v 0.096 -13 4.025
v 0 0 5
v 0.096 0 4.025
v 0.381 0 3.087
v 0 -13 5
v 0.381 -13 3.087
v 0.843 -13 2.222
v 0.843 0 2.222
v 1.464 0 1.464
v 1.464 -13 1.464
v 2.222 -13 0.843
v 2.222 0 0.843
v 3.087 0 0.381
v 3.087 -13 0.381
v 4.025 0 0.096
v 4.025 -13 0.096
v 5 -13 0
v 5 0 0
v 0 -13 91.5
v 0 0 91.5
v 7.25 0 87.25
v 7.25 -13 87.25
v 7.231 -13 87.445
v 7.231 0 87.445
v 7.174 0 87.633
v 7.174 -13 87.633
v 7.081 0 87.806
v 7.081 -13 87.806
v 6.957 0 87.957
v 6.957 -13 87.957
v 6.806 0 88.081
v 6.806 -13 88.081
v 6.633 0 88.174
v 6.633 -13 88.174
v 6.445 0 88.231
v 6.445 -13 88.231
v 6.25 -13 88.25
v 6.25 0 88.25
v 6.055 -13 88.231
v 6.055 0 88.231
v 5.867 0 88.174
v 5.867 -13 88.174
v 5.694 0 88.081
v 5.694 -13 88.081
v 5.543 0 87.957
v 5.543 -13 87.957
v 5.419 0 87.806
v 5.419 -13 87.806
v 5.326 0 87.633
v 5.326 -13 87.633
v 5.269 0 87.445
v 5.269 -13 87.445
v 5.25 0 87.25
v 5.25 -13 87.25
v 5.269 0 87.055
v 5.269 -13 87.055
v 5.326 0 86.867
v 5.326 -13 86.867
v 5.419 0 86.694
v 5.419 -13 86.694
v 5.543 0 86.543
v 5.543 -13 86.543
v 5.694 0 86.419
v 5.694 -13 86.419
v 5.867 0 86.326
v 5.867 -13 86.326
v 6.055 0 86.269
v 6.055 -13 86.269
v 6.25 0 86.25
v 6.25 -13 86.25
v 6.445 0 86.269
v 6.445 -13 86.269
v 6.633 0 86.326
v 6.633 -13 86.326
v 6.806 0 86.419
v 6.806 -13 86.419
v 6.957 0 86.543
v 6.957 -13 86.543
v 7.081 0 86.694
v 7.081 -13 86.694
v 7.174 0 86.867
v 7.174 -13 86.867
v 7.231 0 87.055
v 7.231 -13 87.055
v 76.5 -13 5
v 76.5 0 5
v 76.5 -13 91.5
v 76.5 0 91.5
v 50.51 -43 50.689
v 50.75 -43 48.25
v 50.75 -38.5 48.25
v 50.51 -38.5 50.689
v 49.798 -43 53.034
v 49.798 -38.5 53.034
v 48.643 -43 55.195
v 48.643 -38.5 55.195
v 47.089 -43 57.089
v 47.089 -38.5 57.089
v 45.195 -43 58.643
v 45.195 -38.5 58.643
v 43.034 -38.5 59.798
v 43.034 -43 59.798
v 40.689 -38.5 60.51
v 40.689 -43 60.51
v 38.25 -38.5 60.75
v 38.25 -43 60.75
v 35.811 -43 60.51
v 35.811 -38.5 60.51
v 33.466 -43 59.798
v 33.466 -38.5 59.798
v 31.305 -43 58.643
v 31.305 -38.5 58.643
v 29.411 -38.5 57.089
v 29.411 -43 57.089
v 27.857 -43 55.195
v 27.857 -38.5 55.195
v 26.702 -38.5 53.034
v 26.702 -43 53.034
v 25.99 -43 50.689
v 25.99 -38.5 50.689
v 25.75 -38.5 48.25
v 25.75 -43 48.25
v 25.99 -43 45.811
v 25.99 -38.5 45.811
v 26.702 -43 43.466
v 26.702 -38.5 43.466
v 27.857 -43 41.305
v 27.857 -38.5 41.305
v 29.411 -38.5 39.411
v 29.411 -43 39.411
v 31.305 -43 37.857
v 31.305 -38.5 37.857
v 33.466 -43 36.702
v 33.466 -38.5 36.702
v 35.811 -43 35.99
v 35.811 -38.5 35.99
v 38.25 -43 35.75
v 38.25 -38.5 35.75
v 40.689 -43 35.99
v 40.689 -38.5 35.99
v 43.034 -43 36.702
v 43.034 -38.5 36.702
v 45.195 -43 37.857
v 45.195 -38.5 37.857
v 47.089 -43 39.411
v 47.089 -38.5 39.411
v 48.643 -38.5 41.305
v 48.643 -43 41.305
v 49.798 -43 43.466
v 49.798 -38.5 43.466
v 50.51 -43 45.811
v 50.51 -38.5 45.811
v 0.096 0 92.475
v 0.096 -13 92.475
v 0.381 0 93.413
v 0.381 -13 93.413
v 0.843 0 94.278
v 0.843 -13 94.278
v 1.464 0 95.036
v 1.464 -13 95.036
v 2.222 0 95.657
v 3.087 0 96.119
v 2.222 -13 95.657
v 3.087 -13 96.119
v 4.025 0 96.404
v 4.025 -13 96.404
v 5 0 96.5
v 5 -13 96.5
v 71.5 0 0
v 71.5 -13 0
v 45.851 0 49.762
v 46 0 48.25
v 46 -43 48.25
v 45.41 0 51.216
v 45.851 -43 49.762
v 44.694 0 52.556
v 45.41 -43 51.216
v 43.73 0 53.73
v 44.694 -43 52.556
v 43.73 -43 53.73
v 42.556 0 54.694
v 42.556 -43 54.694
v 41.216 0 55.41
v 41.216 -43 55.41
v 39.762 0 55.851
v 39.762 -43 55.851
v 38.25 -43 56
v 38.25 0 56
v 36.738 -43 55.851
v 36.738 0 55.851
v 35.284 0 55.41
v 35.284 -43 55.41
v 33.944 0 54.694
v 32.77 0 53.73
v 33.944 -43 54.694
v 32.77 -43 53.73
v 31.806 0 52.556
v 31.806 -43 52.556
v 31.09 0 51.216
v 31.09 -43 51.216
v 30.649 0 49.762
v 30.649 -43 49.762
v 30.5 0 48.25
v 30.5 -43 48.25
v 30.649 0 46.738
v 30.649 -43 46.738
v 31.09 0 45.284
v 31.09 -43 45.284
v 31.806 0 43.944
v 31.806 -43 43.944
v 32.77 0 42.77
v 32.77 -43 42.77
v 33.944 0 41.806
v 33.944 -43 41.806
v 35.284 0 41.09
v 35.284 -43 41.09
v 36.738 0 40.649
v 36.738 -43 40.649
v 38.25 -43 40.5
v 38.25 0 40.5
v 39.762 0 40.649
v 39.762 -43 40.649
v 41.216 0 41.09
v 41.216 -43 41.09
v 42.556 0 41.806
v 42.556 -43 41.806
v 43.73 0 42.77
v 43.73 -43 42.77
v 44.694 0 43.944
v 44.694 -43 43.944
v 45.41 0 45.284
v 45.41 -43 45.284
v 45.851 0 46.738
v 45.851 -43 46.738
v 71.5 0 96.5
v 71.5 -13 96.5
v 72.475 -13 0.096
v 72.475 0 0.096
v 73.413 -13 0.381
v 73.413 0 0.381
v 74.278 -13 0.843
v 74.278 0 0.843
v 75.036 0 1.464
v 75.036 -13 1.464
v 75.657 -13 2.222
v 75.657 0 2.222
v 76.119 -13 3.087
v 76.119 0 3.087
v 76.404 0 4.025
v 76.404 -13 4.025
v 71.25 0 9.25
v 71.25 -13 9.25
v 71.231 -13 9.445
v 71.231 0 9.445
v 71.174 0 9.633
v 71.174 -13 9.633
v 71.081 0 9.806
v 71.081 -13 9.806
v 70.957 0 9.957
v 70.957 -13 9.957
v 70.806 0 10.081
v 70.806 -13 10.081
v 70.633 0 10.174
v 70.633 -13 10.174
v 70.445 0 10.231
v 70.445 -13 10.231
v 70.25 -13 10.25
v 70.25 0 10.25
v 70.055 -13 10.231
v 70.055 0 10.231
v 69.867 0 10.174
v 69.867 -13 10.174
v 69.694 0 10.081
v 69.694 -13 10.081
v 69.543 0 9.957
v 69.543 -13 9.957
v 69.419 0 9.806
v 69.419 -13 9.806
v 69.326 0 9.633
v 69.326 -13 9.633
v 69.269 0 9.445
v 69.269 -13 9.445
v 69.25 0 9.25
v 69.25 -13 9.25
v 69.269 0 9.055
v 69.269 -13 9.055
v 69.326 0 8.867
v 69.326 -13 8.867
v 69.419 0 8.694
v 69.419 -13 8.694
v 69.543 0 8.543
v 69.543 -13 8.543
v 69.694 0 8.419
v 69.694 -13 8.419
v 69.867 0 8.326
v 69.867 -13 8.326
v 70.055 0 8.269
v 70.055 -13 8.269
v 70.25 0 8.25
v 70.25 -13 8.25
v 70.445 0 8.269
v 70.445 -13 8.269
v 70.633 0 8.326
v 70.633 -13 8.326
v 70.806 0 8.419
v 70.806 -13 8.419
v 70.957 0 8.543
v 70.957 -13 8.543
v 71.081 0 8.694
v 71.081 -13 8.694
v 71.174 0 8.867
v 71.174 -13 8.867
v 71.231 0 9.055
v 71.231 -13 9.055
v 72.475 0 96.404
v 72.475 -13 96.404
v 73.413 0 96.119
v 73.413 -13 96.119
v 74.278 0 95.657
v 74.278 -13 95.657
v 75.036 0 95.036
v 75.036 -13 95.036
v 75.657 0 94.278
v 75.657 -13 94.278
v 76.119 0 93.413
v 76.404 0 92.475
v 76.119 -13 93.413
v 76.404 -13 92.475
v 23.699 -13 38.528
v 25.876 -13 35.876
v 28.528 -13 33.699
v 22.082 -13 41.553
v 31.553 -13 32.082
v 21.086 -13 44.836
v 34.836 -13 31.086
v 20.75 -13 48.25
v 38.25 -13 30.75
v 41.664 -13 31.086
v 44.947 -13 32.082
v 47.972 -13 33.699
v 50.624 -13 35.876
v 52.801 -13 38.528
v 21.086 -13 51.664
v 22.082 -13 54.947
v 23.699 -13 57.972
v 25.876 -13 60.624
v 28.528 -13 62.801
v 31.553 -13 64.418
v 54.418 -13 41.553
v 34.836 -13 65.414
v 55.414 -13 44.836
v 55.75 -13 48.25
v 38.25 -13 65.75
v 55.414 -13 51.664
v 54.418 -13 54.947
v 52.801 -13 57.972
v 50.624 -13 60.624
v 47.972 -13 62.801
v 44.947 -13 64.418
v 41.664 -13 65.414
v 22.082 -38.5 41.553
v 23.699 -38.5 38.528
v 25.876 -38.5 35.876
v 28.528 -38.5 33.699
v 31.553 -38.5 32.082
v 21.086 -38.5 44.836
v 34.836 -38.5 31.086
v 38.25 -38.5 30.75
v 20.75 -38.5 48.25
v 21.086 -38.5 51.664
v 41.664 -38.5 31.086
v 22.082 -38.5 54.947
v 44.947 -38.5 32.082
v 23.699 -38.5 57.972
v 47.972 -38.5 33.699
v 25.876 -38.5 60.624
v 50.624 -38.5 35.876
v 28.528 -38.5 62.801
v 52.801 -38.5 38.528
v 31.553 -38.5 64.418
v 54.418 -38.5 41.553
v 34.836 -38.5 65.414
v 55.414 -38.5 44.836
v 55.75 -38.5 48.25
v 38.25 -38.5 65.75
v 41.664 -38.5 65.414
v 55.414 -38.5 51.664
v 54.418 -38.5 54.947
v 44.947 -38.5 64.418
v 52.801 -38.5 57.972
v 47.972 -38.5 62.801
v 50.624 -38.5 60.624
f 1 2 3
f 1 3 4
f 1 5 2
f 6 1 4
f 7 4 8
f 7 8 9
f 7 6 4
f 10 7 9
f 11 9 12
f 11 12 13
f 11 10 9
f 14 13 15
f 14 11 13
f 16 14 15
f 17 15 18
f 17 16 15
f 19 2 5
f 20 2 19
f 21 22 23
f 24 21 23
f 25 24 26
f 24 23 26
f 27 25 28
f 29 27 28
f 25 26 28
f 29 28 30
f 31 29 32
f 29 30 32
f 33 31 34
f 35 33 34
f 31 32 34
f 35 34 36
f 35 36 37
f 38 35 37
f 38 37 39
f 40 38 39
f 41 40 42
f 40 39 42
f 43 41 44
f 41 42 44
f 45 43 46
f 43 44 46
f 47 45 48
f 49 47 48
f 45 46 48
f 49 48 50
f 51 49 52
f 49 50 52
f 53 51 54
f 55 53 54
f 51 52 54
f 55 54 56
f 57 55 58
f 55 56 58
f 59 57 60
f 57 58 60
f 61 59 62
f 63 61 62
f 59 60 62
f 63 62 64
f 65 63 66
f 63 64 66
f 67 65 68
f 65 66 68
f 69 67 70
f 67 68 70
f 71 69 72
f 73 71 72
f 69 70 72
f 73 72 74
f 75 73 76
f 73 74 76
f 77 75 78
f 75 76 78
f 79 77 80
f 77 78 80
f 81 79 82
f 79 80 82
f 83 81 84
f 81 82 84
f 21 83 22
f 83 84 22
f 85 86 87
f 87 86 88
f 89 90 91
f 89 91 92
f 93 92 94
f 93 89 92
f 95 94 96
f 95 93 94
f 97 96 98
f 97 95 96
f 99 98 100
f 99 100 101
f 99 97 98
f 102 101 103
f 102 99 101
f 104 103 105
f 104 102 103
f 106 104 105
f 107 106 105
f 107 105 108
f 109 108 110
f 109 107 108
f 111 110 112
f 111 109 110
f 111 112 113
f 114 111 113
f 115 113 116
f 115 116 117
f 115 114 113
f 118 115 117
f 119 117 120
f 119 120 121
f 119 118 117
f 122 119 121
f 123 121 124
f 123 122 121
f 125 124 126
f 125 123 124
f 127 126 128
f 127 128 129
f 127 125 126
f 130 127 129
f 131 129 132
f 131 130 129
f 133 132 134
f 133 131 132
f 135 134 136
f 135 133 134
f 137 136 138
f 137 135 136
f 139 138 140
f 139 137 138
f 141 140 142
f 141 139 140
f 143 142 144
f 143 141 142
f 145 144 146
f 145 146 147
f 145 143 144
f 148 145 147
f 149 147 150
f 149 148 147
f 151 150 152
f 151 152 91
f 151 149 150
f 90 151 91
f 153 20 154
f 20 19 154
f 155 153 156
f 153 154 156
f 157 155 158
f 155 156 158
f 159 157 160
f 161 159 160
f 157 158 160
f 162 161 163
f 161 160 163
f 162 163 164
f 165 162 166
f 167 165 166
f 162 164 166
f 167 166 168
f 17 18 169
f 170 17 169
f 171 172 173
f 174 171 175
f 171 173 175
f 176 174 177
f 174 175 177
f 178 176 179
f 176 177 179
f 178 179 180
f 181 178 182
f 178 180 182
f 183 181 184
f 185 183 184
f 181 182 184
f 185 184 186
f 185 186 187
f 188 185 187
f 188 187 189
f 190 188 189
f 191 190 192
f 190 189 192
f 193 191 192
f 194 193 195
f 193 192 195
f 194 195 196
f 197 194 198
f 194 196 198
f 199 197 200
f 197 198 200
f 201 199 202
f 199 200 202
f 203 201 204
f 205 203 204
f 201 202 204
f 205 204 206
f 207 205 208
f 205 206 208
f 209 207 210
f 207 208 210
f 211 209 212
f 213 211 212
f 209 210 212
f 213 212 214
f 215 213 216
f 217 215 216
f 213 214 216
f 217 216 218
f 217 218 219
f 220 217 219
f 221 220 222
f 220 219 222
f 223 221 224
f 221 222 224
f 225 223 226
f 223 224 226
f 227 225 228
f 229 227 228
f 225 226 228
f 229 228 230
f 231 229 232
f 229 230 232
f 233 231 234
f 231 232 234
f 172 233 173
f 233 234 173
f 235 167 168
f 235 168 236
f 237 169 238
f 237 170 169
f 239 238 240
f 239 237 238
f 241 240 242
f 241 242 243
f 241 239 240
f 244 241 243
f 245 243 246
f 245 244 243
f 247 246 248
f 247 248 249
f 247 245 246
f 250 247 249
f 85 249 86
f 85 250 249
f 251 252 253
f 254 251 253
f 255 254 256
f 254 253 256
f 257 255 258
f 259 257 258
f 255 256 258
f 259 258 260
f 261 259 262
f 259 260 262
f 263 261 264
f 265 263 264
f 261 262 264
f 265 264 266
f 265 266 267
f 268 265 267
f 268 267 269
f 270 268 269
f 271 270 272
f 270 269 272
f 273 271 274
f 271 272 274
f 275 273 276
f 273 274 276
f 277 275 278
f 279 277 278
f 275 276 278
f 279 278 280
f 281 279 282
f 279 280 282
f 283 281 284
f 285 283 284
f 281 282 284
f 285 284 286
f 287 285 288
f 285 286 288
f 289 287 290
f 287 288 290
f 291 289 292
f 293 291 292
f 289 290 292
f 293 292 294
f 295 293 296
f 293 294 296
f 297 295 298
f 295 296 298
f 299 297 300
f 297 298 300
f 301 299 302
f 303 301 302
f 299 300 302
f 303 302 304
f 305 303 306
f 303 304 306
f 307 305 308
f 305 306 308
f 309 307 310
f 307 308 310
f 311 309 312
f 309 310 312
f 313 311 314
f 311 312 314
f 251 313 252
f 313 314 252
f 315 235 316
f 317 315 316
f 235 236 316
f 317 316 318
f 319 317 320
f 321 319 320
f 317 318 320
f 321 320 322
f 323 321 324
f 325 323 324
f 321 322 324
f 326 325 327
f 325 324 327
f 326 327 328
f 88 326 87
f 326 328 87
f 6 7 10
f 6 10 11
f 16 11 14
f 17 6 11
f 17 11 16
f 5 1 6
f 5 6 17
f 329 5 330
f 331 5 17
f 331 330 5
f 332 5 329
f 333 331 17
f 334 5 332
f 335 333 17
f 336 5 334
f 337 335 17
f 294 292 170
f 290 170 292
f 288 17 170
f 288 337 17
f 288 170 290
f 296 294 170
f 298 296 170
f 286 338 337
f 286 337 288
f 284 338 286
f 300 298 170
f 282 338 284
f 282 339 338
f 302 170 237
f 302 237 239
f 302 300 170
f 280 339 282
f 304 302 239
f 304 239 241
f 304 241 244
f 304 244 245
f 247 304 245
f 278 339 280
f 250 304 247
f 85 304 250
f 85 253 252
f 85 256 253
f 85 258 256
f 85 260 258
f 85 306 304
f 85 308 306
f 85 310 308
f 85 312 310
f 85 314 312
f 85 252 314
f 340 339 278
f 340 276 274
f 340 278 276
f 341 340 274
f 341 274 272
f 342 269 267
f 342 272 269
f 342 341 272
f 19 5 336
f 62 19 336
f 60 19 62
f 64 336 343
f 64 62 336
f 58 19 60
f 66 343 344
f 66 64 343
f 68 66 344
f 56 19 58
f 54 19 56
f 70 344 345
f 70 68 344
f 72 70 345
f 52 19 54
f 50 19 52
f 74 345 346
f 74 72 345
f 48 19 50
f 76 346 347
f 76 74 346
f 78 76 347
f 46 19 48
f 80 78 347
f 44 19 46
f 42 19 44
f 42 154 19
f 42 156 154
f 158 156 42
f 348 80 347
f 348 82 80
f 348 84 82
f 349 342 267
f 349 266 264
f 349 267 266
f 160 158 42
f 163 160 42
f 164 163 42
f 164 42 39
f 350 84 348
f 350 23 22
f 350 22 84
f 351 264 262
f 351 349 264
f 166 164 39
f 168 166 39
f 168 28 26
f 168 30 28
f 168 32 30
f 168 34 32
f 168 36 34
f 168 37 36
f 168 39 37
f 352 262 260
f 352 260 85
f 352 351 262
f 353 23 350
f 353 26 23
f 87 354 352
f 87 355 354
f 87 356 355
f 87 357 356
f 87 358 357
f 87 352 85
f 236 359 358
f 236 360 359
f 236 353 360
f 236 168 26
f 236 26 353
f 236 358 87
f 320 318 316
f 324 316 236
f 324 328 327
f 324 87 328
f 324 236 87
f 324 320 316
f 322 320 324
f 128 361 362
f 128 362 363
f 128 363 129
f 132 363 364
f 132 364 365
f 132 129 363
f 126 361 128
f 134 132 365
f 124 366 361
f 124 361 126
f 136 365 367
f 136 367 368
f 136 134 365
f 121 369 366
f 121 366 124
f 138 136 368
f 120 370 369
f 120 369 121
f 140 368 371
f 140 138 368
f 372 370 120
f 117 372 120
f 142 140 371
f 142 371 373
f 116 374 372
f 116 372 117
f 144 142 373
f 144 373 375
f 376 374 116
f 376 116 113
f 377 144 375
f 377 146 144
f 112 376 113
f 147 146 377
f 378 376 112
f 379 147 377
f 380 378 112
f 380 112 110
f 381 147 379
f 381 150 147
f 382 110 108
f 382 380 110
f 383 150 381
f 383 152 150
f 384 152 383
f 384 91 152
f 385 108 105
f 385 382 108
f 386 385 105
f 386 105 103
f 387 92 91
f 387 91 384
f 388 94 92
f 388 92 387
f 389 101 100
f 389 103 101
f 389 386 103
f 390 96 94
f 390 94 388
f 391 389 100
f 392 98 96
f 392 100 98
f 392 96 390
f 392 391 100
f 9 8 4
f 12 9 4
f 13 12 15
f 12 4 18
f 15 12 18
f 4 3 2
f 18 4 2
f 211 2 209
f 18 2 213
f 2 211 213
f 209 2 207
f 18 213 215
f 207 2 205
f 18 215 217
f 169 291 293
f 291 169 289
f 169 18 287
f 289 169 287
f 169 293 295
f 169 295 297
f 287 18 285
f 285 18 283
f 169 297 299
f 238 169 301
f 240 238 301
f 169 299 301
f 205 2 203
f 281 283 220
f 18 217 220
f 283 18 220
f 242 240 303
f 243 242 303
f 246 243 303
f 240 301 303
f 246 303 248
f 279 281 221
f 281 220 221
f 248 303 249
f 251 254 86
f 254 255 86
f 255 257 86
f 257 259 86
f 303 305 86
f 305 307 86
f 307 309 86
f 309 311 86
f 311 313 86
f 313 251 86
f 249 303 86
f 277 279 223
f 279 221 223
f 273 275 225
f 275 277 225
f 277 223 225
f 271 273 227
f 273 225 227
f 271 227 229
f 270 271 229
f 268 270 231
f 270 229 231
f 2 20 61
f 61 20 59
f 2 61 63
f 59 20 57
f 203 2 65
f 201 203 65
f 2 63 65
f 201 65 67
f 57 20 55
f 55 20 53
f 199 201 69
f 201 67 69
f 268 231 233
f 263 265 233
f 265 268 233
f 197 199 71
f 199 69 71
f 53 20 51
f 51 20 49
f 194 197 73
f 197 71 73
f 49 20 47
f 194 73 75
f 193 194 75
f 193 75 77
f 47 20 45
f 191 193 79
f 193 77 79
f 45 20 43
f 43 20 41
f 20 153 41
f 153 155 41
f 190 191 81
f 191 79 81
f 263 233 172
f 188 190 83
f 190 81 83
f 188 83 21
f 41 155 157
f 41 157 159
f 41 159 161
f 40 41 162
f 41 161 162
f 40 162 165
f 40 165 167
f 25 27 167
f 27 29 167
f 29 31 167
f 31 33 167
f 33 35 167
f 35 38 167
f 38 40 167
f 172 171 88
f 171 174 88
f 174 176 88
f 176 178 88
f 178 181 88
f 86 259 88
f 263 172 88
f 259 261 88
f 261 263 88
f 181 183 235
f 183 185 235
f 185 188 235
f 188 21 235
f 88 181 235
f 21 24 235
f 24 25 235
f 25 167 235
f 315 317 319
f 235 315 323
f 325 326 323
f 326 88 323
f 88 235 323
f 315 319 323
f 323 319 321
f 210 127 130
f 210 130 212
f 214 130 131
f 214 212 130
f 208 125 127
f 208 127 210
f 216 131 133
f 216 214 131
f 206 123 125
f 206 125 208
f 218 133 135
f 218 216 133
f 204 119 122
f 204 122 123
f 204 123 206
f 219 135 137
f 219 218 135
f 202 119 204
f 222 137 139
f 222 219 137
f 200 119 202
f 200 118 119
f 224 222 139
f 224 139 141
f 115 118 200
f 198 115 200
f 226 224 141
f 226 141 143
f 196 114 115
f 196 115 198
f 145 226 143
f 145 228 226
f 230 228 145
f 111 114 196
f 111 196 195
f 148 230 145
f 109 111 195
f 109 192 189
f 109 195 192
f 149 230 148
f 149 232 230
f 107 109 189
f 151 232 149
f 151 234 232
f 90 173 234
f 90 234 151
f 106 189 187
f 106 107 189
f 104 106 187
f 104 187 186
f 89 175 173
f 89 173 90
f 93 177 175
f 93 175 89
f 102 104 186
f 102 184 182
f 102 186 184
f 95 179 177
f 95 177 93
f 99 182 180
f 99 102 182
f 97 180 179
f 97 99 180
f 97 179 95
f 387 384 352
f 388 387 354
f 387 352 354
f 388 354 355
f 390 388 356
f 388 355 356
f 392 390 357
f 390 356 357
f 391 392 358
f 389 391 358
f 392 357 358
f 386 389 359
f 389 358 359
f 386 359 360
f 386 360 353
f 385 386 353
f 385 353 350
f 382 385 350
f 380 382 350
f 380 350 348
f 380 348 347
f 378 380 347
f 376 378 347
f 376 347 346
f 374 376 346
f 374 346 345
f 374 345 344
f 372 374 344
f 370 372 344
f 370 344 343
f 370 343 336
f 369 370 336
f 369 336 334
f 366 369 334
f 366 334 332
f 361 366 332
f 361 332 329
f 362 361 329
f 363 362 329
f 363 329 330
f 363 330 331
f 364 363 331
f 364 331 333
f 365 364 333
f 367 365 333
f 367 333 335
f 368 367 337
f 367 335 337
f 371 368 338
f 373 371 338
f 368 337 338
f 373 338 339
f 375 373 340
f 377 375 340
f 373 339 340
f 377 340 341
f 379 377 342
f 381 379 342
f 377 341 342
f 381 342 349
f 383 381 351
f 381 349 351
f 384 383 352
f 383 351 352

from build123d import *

# Parameters (mm, degrees)
F0_W      = 76.5
F0_H      = 96.5
F1_DEPTH  = 13
F2_R      = 17.5
F3_DEPTH  = 30
F4_R      = 5
F5_R      = 17.5
F5_R_2    = 12.5
F6_DEPTH  = 4.5
F7_R      = 7.75
F8_DEPTH  = 43
F9_R      = 1
F10_DEPTH = 13


with BuildPart() as f1:
    # F0 (on Front) → F1 (new body)
    with BuildSketch(Plane.XZ):
        with Locations((38.25, 48.25)):
            Rectangle(F0_W, F0_H)
    extrude(amount=F1_DEPTH)

    # F2 (on face) → F3 (join)
    with BuildSketch(Plane.XZ.offset(13)):
        with Locations((38.25, 48.25)):
            Circle(F2_R)
    extrude(amount=F3_DEPTH)

    # F4
    f4_edges = [f1.edges().sort_by_distance(p)[0] for p in [
        (76.5, -6.5, 96.5),
        (0, -6.5, 96.5),
        (0, -6.5, 0),
        (76.5, -6.5, 0),
    ]]
    fillet(f4_edges, radius=F4_R)

    # F5 (on face) → F6 (cut)
    with BuildSketch(Plane.XZ.offset(43)):
        with Locations((38.25, 48.25)):
            Circle(F5_R)
        with Locations((38.25, 48.25)):
            Circle(F5_R_2, mode=Mode.SUBTRACT)
    extrude(amount=-F6_DEPTH, mode=Mode.SUBTRACT)

    # F7 (on face) → F8 (cut, through all)
    with BuildSketch(Plane.XZ.offset(43)):
        with Locations((38.25, 48.25)):
            Circle(F7_R)
    extrude(amount=-F8_DEPTH, mode=Mode.SUBTRACT)

    # F9 (on face) → F10 (cut, through all)
    with BuildSketch(Plane.XZ.offset(13)):
        with Locations((6.25, 87.25)):
            Circle(F9_R)
        with Locations((70.25, 9.25)):
            Circle(F9_R)
    extrude(amount=-F10_DEPTH, mode=Mode.SUBTRACT)


solid = f1.part
